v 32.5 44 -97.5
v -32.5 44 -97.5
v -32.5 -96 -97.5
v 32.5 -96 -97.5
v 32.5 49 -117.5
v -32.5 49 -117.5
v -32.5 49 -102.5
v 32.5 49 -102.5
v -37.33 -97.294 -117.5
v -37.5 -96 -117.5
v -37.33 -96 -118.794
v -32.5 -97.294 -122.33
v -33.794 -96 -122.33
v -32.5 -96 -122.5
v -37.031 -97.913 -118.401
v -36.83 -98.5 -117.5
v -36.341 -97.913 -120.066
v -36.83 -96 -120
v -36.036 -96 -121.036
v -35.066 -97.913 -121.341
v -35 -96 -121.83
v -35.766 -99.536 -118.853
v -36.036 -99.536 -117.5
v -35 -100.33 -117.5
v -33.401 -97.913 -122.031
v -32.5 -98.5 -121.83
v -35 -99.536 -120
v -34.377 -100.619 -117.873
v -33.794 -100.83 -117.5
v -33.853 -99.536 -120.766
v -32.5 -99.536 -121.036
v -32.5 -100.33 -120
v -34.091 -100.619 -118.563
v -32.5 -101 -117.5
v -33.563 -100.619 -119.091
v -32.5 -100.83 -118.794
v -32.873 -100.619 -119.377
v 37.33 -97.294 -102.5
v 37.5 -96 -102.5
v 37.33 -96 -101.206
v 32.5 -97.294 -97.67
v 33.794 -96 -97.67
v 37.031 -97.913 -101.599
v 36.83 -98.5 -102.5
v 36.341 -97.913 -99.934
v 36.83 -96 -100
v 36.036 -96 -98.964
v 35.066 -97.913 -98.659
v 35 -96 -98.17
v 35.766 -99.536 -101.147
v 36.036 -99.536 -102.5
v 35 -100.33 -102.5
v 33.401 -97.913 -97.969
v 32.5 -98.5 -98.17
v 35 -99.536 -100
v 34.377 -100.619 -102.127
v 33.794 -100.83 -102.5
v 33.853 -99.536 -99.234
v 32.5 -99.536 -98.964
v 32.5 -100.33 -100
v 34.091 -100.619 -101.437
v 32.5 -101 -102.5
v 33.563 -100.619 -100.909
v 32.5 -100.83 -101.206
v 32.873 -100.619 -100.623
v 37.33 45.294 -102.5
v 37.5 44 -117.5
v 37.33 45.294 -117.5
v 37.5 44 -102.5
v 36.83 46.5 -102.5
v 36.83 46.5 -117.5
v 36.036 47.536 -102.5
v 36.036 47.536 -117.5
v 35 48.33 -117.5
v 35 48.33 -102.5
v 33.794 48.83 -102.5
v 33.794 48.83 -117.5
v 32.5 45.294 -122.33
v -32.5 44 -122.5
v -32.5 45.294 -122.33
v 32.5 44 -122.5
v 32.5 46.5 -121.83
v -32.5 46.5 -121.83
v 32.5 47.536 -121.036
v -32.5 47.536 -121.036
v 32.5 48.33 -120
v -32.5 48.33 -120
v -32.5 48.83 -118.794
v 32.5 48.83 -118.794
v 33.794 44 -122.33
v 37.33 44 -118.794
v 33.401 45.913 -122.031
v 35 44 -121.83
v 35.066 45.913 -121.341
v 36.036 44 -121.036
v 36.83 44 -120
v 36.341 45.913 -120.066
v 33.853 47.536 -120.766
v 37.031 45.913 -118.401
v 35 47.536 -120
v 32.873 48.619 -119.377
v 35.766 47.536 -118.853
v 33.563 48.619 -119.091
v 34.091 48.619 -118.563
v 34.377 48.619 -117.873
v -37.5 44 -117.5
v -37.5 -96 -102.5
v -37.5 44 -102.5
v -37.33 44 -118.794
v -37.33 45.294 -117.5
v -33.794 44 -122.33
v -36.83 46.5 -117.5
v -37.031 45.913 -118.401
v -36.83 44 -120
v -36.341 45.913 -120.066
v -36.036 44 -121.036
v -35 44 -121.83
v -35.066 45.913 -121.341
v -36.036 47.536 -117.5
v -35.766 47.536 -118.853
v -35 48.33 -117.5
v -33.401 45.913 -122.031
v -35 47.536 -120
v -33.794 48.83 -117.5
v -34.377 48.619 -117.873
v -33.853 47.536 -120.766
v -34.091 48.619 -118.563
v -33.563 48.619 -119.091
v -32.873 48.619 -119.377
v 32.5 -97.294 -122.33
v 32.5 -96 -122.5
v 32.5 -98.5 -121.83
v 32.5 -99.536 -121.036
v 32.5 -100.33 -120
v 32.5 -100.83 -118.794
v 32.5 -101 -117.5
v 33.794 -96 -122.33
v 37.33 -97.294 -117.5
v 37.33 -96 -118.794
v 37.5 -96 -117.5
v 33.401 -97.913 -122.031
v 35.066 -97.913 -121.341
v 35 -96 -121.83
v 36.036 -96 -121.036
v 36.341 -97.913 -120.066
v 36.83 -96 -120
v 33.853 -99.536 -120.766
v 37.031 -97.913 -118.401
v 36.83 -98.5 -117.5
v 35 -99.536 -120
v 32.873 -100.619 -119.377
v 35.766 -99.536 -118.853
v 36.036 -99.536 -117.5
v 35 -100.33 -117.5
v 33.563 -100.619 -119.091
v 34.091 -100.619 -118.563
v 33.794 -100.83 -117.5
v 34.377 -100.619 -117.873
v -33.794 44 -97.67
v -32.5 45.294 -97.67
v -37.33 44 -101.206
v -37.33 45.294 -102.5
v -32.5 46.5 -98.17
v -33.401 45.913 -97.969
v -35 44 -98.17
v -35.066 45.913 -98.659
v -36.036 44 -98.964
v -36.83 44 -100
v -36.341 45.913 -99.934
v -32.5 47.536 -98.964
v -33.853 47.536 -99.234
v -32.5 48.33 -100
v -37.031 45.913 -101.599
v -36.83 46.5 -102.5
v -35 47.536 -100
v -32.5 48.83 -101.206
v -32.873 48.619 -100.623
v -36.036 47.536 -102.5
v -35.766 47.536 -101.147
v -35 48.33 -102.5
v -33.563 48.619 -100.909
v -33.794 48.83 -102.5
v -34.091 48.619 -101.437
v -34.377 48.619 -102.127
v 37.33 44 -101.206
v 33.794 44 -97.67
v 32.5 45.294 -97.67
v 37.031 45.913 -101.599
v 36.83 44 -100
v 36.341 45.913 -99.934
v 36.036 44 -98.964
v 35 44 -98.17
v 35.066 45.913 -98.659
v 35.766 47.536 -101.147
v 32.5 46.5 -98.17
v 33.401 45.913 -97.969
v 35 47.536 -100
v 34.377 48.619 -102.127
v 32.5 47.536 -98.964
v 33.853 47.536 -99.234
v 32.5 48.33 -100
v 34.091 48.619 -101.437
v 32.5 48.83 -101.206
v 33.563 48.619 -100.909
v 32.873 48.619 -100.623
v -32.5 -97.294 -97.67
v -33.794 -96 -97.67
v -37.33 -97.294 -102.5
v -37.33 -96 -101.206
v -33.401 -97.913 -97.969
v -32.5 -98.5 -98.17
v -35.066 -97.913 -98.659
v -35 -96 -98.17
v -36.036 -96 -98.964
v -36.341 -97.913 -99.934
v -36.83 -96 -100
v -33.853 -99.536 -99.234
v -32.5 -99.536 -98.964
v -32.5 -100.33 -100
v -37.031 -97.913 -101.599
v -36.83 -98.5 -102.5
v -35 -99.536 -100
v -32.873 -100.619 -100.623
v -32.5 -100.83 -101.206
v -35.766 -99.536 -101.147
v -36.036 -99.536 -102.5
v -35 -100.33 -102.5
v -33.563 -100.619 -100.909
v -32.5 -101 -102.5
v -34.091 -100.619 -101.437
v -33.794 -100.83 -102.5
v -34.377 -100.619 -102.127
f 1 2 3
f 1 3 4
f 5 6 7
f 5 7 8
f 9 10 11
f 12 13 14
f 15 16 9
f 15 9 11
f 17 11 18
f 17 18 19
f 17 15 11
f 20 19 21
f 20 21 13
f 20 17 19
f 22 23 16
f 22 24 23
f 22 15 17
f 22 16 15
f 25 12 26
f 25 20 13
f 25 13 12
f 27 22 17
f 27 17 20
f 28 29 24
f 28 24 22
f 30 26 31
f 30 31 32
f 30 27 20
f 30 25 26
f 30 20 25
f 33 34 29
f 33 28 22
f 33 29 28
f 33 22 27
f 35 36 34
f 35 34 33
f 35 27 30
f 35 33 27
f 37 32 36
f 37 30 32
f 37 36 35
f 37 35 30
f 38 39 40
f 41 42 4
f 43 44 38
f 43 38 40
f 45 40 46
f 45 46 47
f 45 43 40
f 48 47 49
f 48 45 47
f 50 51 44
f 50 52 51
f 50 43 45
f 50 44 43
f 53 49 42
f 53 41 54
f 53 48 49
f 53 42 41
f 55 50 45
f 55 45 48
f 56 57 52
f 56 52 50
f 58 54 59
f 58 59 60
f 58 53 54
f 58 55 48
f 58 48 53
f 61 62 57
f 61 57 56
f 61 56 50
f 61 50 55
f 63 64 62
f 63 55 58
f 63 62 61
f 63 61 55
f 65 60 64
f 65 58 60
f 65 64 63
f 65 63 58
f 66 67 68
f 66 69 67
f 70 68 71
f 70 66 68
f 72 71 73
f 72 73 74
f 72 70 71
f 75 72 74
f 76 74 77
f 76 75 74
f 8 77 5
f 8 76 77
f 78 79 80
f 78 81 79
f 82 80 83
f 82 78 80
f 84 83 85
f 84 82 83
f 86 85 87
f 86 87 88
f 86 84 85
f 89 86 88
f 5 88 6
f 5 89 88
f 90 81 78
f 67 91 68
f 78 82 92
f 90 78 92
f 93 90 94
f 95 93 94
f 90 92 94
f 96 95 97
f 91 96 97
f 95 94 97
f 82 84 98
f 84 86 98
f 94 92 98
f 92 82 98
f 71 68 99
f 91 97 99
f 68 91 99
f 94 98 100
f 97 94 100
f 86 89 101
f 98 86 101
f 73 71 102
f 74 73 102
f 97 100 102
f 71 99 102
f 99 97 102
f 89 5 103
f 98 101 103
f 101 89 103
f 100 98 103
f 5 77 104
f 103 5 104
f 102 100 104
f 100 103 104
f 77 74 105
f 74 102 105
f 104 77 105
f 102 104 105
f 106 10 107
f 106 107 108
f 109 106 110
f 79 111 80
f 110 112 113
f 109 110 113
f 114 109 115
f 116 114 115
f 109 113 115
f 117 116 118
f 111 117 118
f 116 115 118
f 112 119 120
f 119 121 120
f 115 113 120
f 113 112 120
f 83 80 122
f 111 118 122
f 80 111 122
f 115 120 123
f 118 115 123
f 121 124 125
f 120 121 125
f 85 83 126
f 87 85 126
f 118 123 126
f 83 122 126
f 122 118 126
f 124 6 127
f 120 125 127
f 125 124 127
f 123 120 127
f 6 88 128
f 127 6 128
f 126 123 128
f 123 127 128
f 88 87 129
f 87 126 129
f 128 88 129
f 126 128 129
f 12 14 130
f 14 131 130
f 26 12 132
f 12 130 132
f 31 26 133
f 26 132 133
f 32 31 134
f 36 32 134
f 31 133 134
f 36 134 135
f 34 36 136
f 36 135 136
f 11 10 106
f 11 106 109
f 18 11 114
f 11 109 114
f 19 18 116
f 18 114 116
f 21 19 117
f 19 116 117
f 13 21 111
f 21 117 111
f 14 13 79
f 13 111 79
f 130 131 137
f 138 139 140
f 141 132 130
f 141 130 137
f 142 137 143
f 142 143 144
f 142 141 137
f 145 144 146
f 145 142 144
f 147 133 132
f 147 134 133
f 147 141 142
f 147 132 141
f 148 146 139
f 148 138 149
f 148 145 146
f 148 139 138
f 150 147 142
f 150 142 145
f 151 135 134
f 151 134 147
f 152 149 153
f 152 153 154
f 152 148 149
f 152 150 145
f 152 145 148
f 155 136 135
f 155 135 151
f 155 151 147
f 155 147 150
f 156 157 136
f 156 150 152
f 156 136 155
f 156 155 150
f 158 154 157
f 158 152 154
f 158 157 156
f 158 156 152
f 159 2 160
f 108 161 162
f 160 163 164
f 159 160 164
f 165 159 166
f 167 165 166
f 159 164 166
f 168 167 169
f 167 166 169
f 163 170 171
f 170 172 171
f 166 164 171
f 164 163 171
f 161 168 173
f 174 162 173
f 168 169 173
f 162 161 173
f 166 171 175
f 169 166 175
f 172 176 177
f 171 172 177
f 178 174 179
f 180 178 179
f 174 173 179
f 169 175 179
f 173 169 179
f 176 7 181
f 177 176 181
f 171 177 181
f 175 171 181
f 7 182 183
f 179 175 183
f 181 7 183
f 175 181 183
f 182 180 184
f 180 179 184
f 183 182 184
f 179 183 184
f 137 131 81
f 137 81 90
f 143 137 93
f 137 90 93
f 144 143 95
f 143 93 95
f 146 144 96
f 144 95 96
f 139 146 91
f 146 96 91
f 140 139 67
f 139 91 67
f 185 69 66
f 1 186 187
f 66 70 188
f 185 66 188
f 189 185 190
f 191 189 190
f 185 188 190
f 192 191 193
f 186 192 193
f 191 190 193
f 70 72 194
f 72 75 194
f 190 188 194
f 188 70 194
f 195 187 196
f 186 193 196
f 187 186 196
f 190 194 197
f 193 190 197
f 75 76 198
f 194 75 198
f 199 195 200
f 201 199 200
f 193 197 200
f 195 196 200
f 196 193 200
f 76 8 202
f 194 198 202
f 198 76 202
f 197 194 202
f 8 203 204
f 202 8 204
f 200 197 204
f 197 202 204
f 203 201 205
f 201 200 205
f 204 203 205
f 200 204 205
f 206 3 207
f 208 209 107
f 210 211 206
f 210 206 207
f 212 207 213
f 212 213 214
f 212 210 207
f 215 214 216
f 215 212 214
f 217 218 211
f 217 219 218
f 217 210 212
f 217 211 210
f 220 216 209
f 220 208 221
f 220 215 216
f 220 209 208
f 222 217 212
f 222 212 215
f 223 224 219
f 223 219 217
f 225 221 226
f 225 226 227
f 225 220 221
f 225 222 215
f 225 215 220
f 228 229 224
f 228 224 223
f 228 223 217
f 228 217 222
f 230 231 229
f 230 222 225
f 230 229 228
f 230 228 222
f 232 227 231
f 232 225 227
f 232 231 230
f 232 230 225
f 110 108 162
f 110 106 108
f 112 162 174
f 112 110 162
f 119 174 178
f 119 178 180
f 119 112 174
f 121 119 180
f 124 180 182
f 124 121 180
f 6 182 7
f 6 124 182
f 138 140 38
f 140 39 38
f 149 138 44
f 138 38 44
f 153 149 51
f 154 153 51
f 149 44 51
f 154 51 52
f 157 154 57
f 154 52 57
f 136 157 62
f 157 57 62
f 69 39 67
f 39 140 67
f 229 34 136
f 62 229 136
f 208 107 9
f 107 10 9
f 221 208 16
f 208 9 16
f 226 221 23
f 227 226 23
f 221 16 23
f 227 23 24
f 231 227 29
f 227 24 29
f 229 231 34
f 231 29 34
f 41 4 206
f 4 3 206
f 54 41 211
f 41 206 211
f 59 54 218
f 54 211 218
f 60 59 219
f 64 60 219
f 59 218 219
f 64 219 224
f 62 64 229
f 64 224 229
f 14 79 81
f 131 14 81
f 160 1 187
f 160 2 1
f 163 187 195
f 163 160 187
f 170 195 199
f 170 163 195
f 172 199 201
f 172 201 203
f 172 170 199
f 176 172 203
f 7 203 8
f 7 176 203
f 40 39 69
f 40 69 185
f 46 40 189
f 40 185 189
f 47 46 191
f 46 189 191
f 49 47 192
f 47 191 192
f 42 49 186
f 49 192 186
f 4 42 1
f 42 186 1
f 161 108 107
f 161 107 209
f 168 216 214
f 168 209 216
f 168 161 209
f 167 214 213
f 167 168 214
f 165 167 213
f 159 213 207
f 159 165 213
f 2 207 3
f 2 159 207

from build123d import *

# Parameters (mm, degrees)
BOX003_W     = 75
BOX003_H     = 150
BOX003_DEPTH = 25
FILLET_R     = 5
FILLET001_R  = 5
FILLET002_R  = 5
FILLET003_R  = 5
FILLET004_R  = 5
FILLET005_R  = 5


with BuildPart() as part:
    # Box003 → Box003 (new body)
    with BuildSketch(Plane(origin=(-37.5, -101, -29), x_dir=(1, 0, 0), z_dir=(0, 0, 1))):
        with Locations((37.5, 75)):
            Rectangle(BOX003_W, BOX003_H)
    extrude(amount=BOX003_DEPTH)

    # Fillet
    fillet_edges = [part.edges().sort_by_distance(p)[0] for p in [
        (-37.5, -26, -4),
    ]]
    fillet(fillet_edges, radius=FILLET_R)

    # Fillet001
    fillet001_edges = [part.edges().sort_by_distance(p)[0] for p in [
        (-37.5, -26, -29),
    ]]
    fillet(fillet001_edges, radius=FILLET001_R)

    # Fillet002
    fillet002_edges = [part.edges().sort_by_distance(p)[0] for p in [
        (37.5, -26, -29),
    ]]
    fillet(fillet002_edges, radius=FILLET002_R)

    # Fillet003
    fillet003_edges = [part.edges().sort_by_distance(p)[0] for p in [
        (37.5, -26, -4),
    ]]
    fillet(fillet003_edges, radius=FILLET003_R)

    # Fillet004
    fillet004_edges = [part.edges().sort_by_distance(p)[0] for p in [
        (0, 49, -29),
    ]]
    fillet(fillet004_edges, radius=FILLET004_R)

    # Fillet005
    fillet005_edges = [part.edges().sort_by_distance(p)[0] for p in [
        (37.5, -101, -16.5),
        (0, -101, -4),
        (0, -101, -29),
        (-37.5, -101, -16.5),
    ]]
    fillet(fillet005_edges, radius=FILLET005_R)


with BuildPart() as part_1:
    # Fillet005 placement: moved
    add(part.part.moved(Location((0, 0, -93.5))))


solid = part_1.part
